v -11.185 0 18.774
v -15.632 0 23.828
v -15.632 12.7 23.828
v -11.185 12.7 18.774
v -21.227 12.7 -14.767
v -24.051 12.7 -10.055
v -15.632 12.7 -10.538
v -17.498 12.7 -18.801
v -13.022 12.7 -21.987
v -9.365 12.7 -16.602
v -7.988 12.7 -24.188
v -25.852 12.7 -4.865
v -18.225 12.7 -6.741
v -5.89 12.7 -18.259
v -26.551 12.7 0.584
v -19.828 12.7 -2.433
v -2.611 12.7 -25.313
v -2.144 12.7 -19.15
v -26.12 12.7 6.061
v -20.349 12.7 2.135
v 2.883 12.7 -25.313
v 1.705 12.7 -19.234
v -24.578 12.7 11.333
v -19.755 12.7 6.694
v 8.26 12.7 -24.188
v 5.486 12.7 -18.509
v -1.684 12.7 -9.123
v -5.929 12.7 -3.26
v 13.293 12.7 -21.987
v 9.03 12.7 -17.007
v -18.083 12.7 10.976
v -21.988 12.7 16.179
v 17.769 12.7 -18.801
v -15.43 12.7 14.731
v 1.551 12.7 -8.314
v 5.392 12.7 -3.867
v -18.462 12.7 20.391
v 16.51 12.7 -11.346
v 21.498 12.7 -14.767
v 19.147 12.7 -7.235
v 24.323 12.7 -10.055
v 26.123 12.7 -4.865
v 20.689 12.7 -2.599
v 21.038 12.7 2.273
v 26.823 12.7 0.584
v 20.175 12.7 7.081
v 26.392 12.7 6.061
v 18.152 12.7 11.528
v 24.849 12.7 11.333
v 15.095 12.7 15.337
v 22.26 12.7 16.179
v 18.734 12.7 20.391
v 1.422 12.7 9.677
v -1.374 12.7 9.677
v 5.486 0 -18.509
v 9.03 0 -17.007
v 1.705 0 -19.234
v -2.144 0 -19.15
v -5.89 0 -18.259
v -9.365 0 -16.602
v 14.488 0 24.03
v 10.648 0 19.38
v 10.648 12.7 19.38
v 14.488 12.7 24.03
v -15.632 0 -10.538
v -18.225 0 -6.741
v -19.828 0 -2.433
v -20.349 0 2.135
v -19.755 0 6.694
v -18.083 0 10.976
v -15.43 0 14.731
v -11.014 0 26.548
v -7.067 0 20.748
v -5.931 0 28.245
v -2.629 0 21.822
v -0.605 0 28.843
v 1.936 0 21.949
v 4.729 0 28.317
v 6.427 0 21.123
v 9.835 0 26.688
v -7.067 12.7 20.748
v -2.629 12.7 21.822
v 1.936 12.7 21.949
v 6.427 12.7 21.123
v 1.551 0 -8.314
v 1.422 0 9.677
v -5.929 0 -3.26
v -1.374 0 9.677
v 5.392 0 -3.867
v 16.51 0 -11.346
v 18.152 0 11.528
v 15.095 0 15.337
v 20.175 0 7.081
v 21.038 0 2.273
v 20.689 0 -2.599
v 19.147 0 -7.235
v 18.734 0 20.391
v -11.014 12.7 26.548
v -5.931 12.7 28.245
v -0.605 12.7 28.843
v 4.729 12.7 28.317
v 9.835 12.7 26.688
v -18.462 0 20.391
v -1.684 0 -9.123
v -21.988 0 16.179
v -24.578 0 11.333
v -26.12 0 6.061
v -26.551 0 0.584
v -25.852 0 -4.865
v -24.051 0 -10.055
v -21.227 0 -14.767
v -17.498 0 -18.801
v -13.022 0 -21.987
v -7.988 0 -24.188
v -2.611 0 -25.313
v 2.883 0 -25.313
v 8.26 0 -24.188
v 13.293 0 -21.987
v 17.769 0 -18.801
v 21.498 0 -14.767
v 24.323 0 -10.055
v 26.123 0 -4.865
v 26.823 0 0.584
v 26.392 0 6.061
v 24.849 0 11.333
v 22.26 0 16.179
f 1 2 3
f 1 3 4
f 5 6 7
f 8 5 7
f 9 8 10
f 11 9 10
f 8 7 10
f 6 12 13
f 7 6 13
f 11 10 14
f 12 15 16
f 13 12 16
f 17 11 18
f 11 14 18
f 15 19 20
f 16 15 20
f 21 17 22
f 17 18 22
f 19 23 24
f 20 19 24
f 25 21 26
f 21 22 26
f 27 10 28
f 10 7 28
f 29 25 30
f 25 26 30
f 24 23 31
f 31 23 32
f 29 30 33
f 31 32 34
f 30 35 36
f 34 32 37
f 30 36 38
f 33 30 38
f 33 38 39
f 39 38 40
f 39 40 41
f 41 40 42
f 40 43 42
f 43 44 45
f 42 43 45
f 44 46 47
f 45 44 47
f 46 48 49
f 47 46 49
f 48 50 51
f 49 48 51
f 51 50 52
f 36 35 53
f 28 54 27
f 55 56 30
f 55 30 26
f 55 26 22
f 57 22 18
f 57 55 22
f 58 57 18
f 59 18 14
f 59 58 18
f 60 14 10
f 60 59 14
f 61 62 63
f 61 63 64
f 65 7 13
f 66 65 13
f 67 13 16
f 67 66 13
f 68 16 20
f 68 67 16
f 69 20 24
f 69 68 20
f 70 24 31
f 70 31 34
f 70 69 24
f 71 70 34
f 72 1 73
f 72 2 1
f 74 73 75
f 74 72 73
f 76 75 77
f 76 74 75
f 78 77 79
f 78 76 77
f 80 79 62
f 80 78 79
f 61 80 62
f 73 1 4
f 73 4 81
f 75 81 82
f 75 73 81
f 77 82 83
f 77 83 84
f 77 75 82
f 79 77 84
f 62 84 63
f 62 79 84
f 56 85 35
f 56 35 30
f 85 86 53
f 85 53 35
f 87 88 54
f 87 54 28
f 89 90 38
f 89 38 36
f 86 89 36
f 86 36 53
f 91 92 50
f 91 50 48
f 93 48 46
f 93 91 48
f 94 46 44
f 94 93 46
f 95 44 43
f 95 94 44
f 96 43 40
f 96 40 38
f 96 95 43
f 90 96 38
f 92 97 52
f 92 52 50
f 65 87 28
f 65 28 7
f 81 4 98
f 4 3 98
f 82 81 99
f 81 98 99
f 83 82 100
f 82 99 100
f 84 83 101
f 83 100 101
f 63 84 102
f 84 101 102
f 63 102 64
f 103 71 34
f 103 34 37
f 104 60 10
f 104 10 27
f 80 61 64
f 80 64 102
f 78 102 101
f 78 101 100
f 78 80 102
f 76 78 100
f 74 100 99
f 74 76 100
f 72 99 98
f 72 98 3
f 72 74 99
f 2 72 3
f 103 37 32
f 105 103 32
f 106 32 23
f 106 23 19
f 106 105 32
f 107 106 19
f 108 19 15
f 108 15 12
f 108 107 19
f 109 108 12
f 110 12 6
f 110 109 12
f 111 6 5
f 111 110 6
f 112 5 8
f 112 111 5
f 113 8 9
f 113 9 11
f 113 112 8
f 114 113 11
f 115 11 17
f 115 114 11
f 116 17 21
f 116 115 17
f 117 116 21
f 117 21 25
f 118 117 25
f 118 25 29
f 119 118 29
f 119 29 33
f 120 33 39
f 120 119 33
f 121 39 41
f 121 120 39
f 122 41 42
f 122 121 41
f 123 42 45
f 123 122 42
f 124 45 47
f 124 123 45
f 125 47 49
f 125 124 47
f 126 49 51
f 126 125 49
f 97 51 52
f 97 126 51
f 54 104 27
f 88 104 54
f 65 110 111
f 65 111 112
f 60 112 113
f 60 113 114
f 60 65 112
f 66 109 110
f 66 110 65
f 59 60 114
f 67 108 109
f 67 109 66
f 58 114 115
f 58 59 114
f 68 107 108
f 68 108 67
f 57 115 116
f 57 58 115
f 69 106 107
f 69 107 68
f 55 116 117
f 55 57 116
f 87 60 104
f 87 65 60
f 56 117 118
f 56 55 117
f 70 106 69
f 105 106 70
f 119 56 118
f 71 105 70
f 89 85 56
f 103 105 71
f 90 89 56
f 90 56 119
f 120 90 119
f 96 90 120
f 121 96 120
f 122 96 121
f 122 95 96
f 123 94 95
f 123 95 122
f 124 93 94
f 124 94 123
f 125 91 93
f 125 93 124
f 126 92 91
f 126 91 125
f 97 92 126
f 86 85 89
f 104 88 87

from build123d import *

# Parameters (mm, degrees)
F1_DEPTH = 12.7


with BuildPart() as f1:
    # F0 (on Front) → F1 (new body)
    with BuildSketch(Plane.XZ):
        with BuildLine():
            ThreePointArc((-11.184599, 18.773926), (-0.34986, 22.005325), (10.647555, 19.380376))
            Line((10.647555, 19.380376), (14.488396, 24.029816))
            ThreePointArc((14.488396, 24.029816), (-0.604731, 28.843341), (-15.63189, 23.827666))
            Line((-15.63189, 23.827666), (-11.184599, 18.773926))
        make_face()
        with BuildLine():
            ThreePointArc((-15.63189, -10.537762), (-20.348723, 2.13513), (-15.42974, 14.730935))
            Line((-15.42974, 14.730935), (-18.461984, 20.391123))
            ThreePointArc((-18.461984, 20.391123), (0.135777, -25.454311), (18.733537, 20.391123))
            Line((18.733537, 20.391123), (15.094845, 15.337384))
            ThreePointArc((15.094845, 15.337384), (21.038361, 2.273178), (16.509891, -11.34636))
            Line((16.509891, -11.34636), (5.391665, -3.866825))
            Line((5.391665, -3.866825), (1.422106, 9.677196))
            Line((1.422106, 9.677196), (1.550824, -8.314116))
            Line((1.550824, -8.314116), (9.030359, -17.006546))
            ThreePointArc((9.030359, -17.006546), (-0.22216, -19.293858), (-9.365253, -16.60225))
            Line((-9.365253, -16.60225), (-1.683568, -9.122713))
            Line((-1.683568, -9.122713), (-1.373787, 9.677196))
            Line((-1.373787, 9.677196), (-5.928711, -3.260376))
            Line((-5.928711, -3.260376), (-15.63189, -10.537762))
        make_face()
    extrude(amount=-F1_DEPTH)


solid = f1.part
